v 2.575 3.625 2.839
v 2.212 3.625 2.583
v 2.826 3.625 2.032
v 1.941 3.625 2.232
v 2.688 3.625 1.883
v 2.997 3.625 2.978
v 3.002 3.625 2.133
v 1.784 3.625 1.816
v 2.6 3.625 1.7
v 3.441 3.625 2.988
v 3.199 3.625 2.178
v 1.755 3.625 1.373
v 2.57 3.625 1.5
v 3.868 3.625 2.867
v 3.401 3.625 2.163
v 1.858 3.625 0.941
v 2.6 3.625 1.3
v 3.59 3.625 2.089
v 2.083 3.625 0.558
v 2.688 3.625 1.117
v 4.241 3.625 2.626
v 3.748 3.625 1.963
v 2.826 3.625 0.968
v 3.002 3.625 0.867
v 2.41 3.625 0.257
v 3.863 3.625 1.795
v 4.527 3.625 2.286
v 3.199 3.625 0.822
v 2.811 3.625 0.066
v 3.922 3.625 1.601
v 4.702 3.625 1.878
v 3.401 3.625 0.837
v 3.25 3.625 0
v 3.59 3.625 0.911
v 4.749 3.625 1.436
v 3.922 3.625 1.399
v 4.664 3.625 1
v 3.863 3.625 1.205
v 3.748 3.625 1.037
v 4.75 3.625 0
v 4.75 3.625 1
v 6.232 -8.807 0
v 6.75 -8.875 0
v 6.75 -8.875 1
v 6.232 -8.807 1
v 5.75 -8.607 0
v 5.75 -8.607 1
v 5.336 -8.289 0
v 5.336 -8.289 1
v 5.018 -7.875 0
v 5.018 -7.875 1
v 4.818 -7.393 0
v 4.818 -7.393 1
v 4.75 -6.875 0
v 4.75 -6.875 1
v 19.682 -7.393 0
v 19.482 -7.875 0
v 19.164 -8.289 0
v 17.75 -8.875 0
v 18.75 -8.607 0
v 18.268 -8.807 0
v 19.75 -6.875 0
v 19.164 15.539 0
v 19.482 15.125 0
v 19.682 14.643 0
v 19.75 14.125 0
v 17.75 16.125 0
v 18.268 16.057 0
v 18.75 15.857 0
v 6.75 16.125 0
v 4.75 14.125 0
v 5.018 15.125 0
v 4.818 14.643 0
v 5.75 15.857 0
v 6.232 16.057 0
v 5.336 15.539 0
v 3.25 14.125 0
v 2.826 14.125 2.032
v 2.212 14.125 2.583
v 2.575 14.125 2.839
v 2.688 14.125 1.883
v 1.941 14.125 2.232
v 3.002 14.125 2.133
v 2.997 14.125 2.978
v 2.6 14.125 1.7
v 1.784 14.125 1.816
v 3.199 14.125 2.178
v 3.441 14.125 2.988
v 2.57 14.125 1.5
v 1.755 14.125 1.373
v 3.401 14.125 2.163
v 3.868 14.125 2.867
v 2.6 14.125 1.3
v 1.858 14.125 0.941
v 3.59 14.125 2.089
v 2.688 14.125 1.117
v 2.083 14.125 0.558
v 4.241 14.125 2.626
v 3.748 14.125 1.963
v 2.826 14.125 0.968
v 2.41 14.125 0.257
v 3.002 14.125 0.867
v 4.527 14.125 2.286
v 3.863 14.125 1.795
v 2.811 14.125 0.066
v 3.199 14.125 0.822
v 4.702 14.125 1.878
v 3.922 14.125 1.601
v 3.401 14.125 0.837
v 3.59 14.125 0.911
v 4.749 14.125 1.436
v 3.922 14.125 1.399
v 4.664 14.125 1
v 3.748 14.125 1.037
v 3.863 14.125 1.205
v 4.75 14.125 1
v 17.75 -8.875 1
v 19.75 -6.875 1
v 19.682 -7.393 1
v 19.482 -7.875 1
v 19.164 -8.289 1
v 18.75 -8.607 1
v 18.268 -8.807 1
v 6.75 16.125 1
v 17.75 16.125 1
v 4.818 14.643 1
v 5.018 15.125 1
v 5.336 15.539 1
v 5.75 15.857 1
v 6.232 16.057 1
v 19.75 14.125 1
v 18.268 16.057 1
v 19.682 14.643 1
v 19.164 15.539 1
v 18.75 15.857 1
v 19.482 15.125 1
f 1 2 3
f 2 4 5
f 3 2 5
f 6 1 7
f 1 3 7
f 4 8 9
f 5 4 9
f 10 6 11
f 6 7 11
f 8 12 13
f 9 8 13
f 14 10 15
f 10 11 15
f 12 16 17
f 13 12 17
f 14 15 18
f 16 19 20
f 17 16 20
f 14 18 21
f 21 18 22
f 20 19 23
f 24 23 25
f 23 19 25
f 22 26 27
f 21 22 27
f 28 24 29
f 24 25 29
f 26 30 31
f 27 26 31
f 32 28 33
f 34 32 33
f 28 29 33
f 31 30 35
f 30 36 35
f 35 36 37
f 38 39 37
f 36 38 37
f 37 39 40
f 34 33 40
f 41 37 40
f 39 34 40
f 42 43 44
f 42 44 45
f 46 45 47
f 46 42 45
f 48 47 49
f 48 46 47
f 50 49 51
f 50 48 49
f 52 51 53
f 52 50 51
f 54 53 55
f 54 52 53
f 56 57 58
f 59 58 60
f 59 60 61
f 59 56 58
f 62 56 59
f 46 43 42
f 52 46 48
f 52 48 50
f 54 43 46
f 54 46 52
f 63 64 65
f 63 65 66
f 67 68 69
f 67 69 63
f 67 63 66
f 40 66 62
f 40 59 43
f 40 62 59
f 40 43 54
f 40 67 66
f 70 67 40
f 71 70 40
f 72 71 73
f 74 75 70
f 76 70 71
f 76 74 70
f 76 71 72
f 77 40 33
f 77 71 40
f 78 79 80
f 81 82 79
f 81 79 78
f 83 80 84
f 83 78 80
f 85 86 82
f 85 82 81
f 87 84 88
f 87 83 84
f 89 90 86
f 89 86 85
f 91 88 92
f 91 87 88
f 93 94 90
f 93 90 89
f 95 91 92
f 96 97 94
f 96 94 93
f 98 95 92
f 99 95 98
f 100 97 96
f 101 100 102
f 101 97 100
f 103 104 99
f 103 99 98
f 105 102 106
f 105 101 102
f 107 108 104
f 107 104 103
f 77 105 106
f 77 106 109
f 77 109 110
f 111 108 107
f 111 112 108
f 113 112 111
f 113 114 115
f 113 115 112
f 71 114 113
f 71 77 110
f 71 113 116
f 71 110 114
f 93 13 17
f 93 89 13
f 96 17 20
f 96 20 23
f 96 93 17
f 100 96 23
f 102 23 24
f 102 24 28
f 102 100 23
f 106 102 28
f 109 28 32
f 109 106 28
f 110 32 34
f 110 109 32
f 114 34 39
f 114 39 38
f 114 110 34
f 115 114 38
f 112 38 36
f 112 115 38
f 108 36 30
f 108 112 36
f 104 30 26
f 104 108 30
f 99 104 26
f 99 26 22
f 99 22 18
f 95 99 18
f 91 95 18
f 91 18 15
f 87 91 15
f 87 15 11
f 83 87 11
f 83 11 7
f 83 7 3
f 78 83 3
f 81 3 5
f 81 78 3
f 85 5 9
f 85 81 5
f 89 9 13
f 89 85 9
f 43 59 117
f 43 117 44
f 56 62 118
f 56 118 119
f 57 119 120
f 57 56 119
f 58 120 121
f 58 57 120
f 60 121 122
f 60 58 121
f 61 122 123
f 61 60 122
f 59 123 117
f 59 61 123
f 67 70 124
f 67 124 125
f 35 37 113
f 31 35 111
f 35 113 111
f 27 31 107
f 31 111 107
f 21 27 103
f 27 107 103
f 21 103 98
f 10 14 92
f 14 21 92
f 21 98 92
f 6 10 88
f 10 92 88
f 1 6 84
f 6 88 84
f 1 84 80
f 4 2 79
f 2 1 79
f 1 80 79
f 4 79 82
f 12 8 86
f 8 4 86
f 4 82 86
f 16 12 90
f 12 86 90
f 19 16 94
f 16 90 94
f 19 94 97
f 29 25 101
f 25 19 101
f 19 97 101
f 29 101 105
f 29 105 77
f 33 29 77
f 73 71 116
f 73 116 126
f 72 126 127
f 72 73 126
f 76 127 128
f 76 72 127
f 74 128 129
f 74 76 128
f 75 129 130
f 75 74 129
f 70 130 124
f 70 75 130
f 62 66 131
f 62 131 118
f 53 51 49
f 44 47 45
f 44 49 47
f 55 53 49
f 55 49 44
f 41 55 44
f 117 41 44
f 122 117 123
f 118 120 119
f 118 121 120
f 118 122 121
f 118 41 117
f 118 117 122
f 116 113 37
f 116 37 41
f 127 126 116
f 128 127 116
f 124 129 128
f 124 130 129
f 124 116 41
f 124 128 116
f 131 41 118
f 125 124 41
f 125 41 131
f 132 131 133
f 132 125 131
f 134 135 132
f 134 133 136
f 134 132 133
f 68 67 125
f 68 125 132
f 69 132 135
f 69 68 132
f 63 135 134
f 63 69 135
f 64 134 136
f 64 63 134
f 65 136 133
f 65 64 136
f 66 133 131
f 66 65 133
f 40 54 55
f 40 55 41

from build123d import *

# Parameters (mm, degrees)
EXTRUDE_1_DEPTH = 1
SKETCH_9_W      = 0.82
SKETCH_9_H      = 10.5
EXTRUDE_4_DEPTH = 10.5


with BuildPart() as part:
    # 草图1 → 凸台-拉伸1 (new body)
    with BuildSketch(Plane.XY):
        with BuildLine():
            Line((17.75, -8.875), (6.75, -8.875))
            ThreePointArc((6.75, -8.875), (5.335786438, -8.289213562), (4.75, -6.875))
            Line((4.75, -6.875), (4.75, 14.125))
            ThreePointArc((4.75, 14.125), (5.335786438, 15.539213562), (6.75, 16.125))
            Line((6.75, 16.125), (17.75, 16.125))
            ThreePointArc((17.75, 16.125), (19.164213562, 15.539213562), (19.75, 14.125))
            Line((19.75, 14.125), (19.75, -6.875))
            ThreePointArc((19.75, -6.875), (19.164213562, -8.289213562), (17.75, -8.875))
        make_face()
    extrude(amount=EXTRUDE_1_DEPTH)



with BuildPart() as body_2:
    # 草图9 → 旋转2 (revolve)
    with BuildSketch(Plane.XY.offset(1.5), mode=Mode.PRIVATE) as revolve_2_sk:
        with Locations((4.34, 8.875)):
            Rectangle(SKETCH_9_W, SKETCH_9_H)
    revolve(revolve_2_sk.sketch.rotate(Axis((3.25, 14.125, 1.5), (0, -1, 0)), 180), axis=Axis((3.25, 14.125, 1.5), (0, -1, 0)))


with BuildPart() as part_1:
    add(part.part)

    add(body_2.part)  # 凸台-拉伸4 merges body 2
    # 草图11 → 凸台-拉伸4 (add)
    with BuildSketch(Plane(origin=(0, 14.125, 0), x_dir=(1, 0, 0), z_dir=(0, 1, 0))):
        with BuildLine():
            Line((4.75, -1), (4.75, -0.82))
            Line((4.75, -0.82), (4.587011593, -0.82))
            ThreePointArc((4.587011593, -0.82), (4.628553577, -0.908738606), (4.664213562, -1))
            Line((4.664213562, -1), (4.75, -1))
        make_face()
        with BuildLine():
            Line((4.75, -0.82), (4.75, 0))
            Line((4.75, 0), (3.25, 0))
            ThreePointArc((3.25, 0), (4.034219357, -0.221328815), (4.587011593, -0.82))
            Line((4.587011593, -0.82), (4.75, -0.82))
        make_face()
    extrude(amount=-EXTRUDE_4_DEPTH)


solid = part_1.part
